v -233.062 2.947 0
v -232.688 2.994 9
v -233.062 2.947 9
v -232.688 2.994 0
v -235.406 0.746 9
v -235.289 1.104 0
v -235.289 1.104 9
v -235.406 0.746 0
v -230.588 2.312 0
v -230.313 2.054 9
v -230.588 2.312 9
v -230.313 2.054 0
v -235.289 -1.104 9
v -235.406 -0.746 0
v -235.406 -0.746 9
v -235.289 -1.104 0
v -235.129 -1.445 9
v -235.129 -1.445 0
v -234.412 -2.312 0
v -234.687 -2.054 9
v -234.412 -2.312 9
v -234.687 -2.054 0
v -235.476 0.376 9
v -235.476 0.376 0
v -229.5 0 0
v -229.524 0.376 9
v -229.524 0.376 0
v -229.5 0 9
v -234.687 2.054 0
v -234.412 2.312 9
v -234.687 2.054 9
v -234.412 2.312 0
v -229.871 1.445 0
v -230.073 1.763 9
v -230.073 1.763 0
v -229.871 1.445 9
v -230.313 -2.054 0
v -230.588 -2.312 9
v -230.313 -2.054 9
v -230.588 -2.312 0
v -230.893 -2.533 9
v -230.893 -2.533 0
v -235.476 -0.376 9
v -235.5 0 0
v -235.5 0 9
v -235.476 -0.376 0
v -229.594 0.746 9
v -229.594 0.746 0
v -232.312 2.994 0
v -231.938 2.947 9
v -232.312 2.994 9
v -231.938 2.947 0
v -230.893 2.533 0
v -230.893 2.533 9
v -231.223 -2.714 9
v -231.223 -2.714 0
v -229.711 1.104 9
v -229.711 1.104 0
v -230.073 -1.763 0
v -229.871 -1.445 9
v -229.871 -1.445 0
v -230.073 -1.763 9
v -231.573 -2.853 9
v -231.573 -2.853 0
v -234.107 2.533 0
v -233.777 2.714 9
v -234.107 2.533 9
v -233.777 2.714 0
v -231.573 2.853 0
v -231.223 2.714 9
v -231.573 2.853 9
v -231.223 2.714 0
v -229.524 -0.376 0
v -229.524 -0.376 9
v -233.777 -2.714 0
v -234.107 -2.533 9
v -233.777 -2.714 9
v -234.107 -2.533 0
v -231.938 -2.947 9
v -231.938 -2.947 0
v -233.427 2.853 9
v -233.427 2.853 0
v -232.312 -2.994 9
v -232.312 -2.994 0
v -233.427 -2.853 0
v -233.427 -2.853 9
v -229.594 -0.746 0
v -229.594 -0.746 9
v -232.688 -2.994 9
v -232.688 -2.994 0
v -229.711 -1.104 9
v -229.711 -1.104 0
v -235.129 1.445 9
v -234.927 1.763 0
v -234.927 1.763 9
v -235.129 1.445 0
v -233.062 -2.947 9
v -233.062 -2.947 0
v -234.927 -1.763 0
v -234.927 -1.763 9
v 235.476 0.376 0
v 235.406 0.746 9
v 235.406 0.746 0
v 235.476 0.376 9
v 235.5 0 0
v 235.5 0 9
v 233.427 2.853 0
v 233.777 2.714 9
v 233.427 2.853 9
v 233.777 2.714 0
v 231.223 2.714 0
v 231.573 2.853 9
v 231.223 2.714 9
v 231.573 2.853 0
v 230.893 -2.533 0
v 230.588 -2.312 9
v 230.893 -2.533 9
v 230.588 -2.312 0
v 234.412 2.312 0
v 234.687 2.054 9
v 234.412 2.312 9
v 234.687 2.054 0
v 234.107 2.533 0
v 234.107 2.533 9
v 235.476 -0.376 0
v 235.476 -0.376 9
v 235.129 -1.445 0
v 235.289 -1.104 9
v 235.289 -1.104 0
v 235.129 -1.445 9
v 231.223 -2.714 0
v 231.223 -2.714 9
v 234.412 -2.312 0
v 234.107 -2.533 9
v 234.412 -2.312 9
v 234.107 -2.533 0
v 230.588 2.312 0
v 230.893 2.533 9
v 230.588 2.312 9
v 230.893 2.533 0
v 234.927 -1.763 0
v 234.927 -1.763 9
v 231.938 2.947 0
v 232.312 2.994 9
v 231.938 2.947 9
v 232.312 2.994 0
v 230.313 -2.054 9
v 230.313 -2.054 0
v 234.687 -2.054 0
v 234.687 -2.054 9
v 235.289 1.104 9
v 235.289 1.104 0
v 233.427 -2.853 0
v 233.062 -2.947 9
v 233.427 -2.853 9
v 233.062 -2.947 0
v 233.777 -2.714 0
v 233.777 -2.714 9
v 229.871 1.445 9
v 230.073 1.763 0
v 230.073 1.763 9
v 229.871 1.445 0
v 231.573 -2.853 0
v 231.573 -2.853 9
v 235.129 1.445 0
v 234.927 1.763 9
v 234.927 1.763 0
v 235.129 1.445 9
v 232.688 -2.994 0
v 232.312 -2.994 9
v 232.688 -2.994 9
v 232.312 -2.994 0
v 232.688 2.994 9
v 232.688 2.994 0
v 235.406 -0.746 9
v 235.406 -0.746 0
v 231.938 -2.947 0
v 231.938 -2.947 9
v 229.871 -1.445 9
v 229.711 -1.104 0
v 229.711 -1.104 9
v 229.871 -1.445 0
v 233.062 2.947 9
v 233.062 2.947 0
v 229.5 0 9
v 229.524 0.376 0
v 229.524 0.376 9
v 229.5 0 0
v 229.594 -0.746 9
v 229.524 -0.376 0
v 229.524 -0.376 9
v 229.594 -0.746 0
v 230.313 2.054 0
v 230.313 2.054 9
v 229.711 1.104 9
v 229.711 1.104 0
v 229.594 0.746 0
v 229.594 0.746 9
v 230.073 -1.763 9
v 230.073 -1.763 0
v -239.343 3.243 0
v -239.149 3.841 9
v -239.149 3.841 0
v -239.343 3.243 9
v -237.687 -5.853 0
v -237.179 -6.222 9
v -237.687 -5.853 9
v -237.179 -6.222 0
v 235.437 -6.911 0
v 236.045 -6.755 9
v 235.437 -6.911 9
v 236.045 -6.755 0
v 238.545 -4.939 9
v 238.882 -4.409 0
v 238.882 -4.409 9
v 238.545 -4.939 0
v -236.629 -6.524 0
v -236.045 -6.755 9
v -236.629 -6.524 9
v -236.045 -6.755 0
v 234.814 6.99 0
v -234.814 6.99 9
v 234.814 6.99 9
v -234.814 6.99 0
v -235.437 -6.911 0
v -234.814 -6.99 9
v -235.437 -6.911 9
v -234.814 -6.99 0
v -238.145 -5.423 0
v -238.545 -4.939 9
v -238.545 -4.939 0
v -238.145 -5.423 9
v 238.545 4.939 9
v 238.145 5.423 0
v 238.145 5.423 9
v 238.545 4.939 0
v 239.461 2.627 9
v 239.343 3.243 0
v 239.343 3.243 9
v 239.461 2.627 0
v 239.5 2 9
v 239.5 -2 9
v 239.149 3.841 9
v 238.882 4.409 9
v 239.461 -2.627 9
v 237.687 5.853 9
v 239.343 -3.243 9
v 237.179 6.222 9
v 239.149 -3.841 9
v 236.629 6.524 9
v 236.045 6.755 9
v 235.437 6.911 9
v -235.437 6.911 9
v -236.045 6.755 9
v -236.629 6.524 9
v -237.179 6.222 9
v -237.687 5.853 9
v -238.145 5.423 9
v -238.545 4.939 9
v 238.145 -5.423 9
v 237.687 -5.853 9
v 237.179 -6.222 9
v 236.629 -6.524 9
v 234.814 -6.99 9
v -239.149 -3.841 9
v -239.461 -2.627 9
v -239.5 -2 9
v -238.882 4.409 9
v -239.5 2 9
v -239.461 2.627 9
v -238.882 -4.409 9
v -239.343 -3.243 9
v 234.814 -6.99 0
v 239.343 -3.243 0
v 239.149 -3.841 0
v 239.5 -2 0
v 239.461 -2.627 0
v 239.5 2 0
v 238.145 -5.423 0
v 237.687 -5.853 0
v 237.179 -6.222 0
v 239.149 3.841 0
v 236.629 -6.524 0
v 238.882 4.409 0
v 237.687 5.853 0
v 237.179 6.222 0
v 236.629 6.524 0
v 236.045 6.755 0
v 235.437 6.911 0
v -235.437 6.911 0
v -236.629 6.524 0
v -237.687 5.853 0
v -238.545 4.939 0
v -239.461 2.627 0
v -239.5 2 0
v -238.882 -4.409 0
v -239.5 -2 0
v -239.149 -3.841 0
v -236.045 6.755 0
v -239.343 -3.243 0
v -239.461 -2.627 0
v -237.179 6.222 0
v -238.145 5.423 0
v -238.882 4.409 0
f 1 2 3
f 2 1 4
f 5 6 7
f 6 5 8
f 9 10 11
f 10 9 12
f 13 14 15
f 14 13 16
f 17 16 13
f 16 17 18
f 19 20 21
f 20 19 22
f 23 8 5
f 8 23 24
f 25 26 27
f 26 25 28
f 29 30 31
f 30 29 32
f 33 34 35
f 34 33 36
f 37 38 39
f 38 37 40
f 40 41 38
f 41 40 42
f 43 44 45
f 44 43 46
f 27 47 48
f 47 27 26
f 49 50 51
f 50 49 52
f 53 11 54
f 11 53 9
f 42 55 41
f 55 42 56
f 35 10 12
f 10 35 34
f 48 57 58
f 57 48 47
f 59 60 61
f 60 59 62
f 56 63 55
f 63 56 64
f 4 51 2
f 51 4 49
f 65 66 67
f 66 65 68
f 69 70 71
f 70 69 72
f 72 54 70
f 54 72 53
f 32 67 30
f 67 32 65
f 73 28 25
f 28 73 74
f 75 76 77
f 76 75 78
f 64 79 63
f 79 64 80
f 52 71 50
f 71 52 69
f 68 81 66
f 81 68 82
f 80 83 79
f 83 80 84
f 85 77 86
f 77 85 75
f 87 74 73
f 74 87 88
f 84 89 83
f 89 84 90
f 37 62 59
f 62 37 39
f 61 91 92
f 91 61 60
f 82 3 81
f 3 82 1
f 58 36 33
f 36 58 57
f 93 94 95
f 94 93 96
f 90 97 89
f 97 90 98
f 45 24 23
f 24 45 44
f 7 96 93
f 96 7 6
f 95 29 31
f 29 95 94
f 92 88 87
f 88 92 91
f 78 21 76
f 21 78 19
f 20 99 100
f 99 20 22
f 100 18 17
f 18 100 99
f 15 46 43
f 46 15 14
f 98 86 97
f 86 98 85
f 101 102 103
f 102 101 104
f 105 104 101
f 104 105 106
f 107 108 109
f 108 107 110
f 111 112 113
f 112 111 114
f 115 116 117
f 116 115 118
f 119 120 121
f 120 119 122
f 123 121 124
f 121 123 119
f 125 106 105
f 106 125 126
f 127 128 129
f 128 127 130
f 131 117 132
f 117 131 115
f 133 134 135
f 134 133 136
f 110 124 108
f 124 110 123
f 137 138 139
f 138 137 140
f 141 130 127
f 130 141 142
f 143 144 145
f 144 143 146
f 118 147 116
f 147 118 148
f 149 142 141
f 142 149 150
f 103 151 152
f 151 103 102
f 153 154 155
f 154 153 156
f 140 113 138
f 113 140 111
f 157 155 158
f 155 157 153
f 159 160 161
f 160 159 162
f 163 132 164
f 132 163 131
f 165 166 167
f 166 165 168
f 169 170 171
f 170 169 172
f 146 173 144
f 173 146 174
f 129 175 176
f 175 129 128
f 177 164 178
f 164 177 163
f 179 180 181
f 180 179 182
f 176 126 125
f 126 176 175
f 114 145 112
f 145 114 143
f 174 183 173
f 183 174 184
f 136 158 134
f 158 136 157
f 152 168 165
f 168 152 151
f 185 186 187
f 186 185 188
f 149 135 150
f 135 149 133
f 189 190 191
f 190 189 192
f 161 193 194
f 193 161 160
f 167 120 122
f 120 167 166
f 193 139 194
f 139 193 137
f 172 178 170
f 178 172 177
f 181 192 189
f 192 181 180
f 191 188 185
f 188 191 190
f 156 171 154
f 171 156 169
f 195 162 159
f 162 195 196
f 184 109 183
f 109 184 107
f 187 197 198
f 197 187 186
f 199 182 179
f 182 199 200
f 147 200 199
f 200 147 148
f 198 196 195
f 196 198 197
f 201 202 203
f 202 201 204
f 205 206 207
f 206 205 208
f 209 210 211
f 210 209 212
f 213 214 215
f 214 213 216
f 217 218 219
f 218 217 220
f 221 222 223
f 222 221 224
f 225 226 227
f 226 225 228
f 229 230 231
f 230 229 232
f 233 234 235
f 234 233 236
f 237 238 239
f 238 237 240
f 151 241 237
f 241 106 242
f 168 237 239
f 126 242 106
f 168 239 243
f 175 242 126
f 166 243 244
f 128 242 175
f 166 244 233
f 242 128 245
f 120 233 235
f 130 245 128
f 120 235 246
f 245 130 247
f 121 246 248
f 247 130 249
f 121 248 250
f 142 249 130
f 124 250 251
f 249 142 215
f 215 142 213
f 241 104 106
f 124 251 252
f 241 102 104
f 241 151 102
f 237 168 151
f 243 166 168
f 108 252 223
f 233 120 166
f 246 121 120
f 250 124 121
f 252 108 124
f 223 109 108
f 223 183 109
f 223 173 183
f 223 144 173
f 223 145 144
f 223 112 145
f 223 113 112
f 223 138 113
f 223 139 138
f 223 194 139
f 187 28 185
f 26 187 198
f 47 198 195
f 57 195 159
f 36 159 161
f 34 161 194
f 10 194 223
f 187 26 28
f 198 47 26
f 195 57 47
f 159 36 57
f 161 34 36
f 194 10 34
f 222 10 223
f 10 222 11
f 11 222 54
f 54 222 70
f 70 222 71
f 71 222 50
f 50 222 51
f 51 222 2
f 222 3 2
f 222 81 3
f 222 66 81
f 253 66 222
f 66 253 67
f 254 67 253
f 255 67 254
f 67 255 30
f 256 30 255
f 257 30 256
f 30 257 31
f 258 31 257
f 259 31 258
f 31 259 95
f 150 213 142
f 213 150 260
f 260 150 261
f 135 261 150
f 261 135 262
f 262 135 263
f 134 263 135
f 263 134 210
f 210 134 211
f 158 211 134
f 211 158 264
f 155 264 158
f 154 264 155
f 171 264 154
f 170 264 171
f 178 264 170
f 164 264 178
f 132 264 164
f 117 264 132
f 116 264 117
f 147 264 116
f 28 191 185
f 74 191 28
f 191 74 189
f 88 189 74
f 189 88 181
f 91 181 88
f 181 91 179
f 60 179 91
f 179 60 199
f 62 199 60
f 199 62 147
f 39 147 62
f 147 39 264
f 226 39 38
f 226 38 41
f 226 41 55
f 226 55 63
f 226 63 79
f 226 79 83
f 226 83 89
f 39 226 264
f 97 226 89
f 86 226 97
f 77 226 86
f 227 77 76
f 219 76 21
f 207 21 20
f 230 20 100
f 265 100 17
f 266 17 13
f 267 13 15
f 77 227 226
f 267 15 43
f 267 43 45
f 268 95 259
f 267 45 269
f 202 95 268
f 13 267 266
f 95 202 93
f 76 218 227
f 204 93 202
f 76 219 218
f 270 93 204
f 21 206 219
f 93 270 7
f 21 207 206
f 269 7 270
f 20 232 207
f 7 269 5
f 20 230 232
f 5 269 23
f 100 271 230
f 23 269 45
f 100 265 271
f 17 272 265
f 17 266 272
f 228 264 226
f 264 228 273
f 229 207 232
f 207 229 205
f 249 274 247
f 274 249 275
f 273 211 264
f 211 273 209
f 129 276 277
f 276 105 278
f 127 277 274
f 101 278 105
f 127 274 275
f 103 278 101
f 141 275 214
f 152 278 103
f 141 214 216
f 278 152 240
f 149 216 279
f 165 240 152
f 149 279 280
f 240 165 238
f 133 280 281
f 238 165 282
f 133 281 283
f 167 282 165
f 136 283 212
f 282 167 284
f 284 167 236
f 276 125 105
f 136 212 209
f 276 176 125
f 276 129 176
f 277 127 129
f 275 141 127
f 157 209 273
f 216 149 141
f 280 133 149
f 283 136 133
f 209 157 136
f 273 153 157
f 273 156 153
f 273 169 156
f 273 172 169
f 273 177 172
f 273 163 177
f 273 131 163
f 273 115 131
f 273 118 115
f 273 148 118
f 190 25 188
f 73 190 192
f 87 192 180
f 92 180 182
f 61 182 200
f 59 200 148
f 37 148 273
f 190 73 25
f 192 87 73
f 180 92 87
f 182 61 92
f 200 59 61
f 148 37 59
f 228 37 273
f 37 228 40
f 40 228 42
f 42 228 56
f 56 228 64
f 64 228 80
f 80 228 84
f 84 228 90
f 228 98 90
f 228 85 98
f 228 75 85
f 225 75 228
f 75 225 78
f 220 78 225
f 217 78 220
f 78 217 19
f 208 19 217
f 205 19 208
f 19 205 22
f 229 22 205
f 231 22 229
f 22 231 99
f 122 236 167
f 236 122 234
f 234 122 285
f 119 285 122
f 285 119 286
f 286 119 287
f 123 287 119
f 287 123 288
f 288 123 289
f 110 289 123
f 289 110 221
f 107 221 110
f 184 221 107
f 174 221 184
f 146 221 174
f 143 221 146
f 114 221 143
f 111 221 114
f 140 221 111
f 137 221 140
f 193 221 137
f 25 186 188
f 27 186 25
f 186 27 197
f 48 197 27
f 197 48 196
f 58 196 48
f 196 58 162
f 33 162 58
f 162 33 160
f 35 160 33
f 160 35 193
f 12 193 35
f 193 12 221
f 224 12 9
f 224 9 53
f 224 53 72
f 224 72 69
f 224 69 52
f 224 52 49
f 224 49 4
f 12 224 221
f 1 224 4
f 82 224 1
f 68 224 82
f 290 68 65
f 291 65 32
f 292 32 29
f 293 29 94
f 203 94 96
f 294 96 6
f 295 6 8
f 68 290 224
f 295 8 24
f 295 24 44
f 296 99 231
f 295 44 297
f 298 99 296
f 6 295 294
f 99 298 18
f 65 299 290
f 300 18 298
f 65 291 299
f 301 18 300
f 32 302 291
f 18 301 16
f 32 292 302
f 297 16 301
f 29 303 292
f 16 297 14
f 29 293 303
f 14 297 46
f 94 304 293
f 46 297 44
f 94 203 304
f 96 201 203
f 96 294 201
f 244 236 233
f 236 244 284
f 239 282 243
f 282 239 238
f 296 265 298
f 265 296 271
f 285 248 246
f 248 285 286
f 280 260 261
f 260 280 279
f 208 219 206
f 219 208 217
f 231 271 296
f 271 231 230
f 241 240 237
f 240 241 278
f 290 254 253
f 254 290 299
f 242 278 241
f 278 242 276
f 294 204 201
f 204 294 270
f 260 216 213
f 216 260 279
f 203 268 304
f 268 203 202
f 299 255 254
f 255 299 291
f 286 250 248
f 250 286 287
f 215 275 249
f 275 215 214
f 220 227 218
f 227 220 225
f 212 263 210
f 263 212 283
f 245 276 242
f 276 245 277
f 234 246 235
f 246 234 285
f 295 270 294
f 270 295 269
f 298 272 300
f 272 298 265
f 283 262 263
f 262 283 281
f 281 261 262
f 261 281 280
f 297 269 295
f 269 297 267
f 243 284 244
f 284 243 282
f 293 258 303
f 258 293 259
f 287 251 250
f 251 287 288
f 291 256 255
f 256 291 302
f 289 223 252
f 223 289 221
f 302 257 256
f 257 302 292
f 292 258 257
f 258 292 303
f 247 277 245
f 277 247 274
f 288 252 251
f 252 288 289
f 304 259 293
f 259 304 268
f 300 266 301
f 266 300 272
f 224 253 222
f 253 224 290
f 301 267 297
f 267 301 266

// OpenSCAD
$fn = 50;


difference() {
	union() {
		hull() {
			translate(v = [-234.5000000000, 2.0000000000, 0]) {
				cylinder(h = 9, r = 5);
			}
			translate(v = [234.5000000000, 2.0000000000, 0]) {
				cylinder(h = 9, r = 5);
			}
			translate(v = [-234.5000000000, -2.0000000000, 0]) {
				cylinder(h = 9, r = 5);
			}
			translate(v = [234.5000000000, -2.0000000000, 0]) {
				cylinder(h = 9, r = 5);
			}
		}
	}
	union() {
		translate(v = [-232.5000000000, 0.0000000000, -100.0000000000]) {
			cylinder(h = 200, r = 3.0000000000);
		}
		translate(v = [-232.5000000000, 0.0000000000, -100.0000000000]) {
			cylinder(h = 200, r = 3.0000000000);
		}
		translate(v = [232.5000000000, 0.0000000000, -100.0000000000]) {
			cylinder(h = 200, r = 3.0000000000);
		}
		translate(v = [232.5000000000, 0.0000000000, -100.0000000000]) {
			cylinder(h = 200, r = 3.0000000000);
		}
	}
}
